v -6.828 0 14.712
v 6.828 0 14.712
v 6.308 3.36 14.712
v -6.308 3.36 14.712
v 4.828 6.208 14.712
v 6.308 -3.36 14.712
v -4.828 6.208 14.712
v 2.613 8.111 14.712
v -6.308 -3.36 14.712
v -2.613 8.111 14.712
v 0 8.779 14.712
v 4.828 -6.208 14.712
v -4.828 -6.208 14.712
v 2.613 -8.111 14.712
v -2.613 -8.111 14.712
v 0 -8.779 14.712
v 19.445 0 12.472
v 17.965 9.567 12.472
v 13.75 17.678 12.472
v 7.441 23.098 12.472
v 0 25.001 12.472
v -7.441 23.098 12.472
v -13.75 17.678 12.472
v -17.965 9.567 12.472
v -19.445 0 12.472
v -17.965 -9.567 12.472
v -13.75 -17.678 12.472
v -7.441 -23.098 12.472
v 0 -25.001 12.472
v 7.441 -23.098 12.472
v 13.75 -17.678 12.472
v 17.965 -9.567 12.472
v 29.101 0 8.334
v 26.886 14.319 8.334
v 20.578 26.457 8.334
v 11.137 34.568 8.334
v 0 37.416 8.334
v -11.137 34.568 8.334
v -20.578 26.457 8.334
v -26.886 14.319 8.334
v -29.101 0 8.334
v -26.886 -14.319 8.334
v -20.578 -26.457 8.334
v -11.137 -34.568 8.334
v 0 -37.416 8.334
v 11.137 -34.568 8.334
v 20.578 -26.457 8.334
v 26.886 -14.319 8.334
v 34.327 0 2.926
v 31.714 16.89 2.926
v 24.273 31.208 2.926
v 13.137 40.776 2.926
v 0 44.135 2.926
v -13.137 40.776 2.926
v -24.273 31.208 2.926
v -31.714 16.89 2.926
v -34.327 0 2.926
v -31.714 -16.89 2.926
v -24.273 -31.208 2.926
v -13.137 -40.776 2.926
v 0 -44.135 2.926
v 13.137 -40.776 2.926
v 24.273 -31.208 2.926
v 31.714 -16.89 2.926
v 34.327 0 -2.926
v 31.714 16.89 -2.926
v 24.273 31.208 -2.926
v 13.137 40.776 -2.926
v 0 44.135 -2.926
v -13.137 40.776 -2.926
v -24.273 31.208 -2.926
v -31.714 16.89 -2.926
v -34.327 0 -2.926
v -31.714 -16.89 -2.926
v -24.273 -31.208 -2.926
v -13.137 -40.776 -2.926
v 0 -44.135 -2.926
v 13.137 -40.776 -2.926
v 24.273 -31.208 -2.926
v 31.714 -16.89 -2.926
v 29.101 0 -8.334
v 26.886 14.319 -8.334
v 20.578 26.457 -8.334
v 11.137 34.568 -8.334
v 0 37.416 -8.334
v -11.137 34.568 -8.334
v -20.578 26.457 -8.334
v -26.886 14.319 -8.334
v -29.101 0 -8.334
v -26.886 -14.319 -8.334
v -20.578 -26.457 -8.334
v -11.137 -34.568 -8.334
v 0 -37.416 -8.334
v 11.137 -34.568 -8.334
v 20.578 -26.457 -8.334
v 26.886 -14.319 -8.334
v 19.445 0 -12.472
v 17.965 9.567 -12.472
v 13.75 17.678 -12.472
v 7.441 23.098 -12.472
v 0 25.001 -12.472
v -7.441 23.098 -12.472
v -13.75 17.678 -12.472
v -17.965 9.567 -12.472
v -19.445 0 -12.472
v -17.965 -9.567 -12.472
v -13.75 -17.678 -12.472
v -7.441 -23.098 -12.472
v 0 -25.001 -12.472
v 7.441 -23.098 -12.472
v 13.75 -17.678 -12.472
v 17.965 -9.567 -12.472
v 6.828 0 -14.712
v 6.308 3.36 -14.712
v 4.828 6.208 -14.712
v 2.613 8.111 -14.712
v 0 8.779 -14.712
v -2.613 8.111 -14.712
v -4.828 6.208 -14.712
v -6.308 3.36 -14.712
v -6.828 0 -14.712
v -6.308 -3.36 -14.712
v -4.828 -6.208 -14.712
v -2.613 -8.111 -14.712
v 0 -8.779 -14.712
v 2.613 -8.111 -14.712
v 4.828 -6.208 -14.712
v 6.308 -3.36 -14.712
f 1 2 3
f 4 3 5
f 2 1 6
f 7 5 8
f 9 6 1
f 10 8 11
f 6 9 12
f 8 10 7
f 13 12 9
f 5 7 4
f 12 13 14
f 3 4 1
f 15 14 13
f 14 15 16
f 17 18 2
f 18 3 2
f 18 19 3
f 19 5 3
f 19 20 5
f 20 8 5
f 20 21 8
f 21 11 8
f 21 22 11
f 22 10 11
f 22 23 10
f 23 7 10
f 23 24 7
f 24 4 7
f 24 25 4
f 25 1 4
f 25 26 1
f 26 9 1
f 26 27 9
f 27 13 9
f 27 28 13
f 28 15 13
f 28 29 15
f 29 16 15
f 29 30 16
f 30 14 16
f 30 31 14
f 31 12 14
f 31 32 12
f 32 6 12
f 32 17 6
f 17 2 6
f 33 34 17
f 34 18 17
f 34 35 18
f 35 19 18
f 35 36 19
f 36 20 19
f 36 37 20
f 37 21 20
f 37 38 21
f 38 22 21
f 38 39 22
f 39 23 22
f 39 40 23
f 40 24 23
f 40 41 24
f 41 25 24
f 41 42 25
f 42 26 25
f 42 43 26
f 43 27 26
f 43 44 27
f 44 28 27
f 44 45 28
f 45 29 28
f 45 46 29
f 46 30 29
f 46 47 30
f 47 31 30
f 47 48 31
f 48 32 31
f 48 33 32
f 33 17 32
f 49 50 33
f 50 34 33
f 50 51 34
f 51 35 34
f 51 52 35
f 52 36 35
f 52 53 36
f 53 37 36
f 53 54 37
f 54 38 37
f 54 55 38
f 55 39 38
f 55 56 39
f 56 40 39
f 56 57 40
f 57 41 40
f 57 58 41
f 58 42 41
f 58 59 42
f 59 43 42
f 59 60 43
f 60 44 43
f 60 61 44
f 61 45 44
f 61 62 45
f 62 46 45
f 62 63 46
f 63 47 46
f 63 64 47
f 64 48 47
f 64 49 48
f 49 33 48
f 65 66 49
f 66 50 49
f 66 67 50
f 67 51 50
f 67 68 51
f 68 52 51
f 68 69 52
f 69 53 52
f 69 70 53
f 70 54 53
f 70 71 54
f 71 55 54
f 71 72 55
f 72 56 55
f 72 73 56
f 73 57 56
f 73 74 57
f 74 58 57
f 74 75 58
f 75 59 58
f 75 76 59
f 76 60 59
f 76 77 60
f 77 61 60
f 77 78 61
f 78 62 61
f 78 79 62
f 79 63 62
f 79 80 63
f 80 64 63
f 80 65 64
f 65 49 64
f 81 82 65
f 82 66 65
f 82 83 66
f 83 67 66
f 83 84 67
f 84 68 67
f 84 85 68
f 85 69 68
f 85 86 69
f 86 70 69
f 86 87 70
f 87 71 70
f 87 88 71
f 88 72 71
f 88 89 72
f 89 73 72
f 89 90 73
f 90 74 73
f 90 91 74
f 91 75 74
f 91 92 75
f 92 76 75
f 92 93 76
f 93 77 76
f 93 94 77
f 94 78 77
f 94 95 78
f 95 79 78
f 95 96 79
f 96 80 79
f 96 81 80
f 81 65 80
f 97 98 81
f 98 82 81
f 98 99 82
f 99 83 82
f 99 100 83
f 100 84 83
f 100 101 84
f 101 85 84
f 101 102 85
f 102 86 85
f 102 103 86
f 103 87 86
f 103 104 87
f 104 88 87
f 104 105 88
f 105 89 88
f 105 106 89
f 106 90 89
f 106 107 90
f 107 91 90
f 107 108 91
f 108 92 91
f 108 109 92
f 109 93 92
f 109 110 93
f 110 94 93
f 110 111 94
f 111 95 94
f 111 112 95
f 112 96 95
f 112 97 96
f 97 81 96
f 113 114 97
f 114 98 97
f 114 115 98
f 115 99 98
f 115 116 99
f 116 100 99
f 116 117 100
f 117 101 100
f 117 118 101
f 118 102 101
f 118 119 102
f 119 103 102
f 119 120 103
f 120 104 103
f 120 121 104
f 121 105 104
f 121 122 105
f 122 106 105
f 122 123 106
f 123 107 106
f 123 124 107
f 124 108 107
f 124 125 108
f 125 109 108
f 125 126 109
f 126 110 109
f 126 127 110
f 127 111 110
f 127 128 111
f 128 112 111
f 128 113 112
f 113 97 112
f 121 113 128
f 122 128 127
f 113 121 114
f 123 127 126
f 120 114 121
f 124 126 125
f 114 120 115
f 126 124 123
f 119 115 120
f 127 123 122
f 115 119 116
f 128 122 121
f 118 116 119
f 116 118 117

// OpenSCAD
// Generated by SolidPython 1.0.1 on 2020-07-29 00:46:47


scale(v = [7, 9, 3]) {
	sphere(r = 5);
}
/***********************************************
*********      SolidPython code:      **********
************************************************
 
# import packages: SolidPython
from solid import *
from solid.utils import *
from itertools import chain, combinations, permutations


class Resize:

    def __init__(self, scad_file):
        self.scad_file = scad_file
        #self.scad_file = import_scad(scad_file)
        # cone/cylinder param:
        self.r1 = 0
        self.r2 = 0
        self.h = 0
        # rectangular prism param:
        self.w = 0
        self.l = 0
        # ellipse param:
        self.r = 0

    # import OpenScad code (file name corresponds to shape)


    # classify shape + parameters
    def assign(self, param1, param2, param3):
        if self.scad_file == 'cone.scad':
            self.r1 = param1
            self.r2 = param2
            self.h = param3
        elif self.scad_file == 'cylinder.scad':
            self.r1 = param1
            self.r2 = param2
            self.h = param3
        elif self.scad_file == 'rectangularPrism.scad':
            self.h = param1
            self.l = param2
            self.w = param3
        else:
            self.r = param1
            self.h = param2

    # resize parameters
    def iterate(self):
        x = range(3, 20, 2)
        i = 1
        if self.scad_file == 'cone.scad':
            tempList = list(permutations(x, 2))
            for temp in tempList:
                param1 = temp[0]
                param2 = temp[1]
                filepath = 'produced_scad_files/' + 'cone' + str(param1) + '_' + str(param2) + '_' + '.scad'
                scad_render_to_file(cylinder(h=param1, r1=param2, r2=0), filepath)

        elif self.scad_file == 'cylinder.scad':
            tempList = list(permutations(x, 3))
            for temp in tempList:
                param1 = temp[0]
                param2 = temp[1]
                filepath = 'produced_scad_files/' + 'cylinder' + str(param1) + '_' + str(param2) + '_' + '.scad'
                scad_render_to_file(cylinder(h=param1, r1=param2, r2=param2), filepath)

        elif self.scad_file == 'rectangularPrism.scad':
            tempList = list(permutations(x, 3))
            for temp in tempList:
                param1 = temp[0]
                param2 = temp[1]
                param3 = temp[2]
                filepath = 'produced_scad_files/' + 'rectangularPrism' + str(param1) + '_' + str(param2) + '_' + str(
                    param3) + '.scad'
                scad_render_to_file(cube(size=(param1, param2, param3)), filepath)

        elif self.scad_file == 'ellipse.scad':
            tempList = list(permutations(x, 4))
            for temp in tempList:
                param1 = temp[0]
                param2 = temp[1]
                param3 = temp[2]
                param4 = temp[3]
                filepath = 'produced_scad_files/' + 'ellipse' + str(param1) + '_' + str(param2) + '_' + str(param3) + '_' + str(param4) + '.scad'
                scad_render_to_file(scale([param1, param2, param3])(sphere(r=param4)), filepath)

    def render_to_scadfile(self):
        scad_render_to_file(scad, 'example.scad') 
 
************************************************/
